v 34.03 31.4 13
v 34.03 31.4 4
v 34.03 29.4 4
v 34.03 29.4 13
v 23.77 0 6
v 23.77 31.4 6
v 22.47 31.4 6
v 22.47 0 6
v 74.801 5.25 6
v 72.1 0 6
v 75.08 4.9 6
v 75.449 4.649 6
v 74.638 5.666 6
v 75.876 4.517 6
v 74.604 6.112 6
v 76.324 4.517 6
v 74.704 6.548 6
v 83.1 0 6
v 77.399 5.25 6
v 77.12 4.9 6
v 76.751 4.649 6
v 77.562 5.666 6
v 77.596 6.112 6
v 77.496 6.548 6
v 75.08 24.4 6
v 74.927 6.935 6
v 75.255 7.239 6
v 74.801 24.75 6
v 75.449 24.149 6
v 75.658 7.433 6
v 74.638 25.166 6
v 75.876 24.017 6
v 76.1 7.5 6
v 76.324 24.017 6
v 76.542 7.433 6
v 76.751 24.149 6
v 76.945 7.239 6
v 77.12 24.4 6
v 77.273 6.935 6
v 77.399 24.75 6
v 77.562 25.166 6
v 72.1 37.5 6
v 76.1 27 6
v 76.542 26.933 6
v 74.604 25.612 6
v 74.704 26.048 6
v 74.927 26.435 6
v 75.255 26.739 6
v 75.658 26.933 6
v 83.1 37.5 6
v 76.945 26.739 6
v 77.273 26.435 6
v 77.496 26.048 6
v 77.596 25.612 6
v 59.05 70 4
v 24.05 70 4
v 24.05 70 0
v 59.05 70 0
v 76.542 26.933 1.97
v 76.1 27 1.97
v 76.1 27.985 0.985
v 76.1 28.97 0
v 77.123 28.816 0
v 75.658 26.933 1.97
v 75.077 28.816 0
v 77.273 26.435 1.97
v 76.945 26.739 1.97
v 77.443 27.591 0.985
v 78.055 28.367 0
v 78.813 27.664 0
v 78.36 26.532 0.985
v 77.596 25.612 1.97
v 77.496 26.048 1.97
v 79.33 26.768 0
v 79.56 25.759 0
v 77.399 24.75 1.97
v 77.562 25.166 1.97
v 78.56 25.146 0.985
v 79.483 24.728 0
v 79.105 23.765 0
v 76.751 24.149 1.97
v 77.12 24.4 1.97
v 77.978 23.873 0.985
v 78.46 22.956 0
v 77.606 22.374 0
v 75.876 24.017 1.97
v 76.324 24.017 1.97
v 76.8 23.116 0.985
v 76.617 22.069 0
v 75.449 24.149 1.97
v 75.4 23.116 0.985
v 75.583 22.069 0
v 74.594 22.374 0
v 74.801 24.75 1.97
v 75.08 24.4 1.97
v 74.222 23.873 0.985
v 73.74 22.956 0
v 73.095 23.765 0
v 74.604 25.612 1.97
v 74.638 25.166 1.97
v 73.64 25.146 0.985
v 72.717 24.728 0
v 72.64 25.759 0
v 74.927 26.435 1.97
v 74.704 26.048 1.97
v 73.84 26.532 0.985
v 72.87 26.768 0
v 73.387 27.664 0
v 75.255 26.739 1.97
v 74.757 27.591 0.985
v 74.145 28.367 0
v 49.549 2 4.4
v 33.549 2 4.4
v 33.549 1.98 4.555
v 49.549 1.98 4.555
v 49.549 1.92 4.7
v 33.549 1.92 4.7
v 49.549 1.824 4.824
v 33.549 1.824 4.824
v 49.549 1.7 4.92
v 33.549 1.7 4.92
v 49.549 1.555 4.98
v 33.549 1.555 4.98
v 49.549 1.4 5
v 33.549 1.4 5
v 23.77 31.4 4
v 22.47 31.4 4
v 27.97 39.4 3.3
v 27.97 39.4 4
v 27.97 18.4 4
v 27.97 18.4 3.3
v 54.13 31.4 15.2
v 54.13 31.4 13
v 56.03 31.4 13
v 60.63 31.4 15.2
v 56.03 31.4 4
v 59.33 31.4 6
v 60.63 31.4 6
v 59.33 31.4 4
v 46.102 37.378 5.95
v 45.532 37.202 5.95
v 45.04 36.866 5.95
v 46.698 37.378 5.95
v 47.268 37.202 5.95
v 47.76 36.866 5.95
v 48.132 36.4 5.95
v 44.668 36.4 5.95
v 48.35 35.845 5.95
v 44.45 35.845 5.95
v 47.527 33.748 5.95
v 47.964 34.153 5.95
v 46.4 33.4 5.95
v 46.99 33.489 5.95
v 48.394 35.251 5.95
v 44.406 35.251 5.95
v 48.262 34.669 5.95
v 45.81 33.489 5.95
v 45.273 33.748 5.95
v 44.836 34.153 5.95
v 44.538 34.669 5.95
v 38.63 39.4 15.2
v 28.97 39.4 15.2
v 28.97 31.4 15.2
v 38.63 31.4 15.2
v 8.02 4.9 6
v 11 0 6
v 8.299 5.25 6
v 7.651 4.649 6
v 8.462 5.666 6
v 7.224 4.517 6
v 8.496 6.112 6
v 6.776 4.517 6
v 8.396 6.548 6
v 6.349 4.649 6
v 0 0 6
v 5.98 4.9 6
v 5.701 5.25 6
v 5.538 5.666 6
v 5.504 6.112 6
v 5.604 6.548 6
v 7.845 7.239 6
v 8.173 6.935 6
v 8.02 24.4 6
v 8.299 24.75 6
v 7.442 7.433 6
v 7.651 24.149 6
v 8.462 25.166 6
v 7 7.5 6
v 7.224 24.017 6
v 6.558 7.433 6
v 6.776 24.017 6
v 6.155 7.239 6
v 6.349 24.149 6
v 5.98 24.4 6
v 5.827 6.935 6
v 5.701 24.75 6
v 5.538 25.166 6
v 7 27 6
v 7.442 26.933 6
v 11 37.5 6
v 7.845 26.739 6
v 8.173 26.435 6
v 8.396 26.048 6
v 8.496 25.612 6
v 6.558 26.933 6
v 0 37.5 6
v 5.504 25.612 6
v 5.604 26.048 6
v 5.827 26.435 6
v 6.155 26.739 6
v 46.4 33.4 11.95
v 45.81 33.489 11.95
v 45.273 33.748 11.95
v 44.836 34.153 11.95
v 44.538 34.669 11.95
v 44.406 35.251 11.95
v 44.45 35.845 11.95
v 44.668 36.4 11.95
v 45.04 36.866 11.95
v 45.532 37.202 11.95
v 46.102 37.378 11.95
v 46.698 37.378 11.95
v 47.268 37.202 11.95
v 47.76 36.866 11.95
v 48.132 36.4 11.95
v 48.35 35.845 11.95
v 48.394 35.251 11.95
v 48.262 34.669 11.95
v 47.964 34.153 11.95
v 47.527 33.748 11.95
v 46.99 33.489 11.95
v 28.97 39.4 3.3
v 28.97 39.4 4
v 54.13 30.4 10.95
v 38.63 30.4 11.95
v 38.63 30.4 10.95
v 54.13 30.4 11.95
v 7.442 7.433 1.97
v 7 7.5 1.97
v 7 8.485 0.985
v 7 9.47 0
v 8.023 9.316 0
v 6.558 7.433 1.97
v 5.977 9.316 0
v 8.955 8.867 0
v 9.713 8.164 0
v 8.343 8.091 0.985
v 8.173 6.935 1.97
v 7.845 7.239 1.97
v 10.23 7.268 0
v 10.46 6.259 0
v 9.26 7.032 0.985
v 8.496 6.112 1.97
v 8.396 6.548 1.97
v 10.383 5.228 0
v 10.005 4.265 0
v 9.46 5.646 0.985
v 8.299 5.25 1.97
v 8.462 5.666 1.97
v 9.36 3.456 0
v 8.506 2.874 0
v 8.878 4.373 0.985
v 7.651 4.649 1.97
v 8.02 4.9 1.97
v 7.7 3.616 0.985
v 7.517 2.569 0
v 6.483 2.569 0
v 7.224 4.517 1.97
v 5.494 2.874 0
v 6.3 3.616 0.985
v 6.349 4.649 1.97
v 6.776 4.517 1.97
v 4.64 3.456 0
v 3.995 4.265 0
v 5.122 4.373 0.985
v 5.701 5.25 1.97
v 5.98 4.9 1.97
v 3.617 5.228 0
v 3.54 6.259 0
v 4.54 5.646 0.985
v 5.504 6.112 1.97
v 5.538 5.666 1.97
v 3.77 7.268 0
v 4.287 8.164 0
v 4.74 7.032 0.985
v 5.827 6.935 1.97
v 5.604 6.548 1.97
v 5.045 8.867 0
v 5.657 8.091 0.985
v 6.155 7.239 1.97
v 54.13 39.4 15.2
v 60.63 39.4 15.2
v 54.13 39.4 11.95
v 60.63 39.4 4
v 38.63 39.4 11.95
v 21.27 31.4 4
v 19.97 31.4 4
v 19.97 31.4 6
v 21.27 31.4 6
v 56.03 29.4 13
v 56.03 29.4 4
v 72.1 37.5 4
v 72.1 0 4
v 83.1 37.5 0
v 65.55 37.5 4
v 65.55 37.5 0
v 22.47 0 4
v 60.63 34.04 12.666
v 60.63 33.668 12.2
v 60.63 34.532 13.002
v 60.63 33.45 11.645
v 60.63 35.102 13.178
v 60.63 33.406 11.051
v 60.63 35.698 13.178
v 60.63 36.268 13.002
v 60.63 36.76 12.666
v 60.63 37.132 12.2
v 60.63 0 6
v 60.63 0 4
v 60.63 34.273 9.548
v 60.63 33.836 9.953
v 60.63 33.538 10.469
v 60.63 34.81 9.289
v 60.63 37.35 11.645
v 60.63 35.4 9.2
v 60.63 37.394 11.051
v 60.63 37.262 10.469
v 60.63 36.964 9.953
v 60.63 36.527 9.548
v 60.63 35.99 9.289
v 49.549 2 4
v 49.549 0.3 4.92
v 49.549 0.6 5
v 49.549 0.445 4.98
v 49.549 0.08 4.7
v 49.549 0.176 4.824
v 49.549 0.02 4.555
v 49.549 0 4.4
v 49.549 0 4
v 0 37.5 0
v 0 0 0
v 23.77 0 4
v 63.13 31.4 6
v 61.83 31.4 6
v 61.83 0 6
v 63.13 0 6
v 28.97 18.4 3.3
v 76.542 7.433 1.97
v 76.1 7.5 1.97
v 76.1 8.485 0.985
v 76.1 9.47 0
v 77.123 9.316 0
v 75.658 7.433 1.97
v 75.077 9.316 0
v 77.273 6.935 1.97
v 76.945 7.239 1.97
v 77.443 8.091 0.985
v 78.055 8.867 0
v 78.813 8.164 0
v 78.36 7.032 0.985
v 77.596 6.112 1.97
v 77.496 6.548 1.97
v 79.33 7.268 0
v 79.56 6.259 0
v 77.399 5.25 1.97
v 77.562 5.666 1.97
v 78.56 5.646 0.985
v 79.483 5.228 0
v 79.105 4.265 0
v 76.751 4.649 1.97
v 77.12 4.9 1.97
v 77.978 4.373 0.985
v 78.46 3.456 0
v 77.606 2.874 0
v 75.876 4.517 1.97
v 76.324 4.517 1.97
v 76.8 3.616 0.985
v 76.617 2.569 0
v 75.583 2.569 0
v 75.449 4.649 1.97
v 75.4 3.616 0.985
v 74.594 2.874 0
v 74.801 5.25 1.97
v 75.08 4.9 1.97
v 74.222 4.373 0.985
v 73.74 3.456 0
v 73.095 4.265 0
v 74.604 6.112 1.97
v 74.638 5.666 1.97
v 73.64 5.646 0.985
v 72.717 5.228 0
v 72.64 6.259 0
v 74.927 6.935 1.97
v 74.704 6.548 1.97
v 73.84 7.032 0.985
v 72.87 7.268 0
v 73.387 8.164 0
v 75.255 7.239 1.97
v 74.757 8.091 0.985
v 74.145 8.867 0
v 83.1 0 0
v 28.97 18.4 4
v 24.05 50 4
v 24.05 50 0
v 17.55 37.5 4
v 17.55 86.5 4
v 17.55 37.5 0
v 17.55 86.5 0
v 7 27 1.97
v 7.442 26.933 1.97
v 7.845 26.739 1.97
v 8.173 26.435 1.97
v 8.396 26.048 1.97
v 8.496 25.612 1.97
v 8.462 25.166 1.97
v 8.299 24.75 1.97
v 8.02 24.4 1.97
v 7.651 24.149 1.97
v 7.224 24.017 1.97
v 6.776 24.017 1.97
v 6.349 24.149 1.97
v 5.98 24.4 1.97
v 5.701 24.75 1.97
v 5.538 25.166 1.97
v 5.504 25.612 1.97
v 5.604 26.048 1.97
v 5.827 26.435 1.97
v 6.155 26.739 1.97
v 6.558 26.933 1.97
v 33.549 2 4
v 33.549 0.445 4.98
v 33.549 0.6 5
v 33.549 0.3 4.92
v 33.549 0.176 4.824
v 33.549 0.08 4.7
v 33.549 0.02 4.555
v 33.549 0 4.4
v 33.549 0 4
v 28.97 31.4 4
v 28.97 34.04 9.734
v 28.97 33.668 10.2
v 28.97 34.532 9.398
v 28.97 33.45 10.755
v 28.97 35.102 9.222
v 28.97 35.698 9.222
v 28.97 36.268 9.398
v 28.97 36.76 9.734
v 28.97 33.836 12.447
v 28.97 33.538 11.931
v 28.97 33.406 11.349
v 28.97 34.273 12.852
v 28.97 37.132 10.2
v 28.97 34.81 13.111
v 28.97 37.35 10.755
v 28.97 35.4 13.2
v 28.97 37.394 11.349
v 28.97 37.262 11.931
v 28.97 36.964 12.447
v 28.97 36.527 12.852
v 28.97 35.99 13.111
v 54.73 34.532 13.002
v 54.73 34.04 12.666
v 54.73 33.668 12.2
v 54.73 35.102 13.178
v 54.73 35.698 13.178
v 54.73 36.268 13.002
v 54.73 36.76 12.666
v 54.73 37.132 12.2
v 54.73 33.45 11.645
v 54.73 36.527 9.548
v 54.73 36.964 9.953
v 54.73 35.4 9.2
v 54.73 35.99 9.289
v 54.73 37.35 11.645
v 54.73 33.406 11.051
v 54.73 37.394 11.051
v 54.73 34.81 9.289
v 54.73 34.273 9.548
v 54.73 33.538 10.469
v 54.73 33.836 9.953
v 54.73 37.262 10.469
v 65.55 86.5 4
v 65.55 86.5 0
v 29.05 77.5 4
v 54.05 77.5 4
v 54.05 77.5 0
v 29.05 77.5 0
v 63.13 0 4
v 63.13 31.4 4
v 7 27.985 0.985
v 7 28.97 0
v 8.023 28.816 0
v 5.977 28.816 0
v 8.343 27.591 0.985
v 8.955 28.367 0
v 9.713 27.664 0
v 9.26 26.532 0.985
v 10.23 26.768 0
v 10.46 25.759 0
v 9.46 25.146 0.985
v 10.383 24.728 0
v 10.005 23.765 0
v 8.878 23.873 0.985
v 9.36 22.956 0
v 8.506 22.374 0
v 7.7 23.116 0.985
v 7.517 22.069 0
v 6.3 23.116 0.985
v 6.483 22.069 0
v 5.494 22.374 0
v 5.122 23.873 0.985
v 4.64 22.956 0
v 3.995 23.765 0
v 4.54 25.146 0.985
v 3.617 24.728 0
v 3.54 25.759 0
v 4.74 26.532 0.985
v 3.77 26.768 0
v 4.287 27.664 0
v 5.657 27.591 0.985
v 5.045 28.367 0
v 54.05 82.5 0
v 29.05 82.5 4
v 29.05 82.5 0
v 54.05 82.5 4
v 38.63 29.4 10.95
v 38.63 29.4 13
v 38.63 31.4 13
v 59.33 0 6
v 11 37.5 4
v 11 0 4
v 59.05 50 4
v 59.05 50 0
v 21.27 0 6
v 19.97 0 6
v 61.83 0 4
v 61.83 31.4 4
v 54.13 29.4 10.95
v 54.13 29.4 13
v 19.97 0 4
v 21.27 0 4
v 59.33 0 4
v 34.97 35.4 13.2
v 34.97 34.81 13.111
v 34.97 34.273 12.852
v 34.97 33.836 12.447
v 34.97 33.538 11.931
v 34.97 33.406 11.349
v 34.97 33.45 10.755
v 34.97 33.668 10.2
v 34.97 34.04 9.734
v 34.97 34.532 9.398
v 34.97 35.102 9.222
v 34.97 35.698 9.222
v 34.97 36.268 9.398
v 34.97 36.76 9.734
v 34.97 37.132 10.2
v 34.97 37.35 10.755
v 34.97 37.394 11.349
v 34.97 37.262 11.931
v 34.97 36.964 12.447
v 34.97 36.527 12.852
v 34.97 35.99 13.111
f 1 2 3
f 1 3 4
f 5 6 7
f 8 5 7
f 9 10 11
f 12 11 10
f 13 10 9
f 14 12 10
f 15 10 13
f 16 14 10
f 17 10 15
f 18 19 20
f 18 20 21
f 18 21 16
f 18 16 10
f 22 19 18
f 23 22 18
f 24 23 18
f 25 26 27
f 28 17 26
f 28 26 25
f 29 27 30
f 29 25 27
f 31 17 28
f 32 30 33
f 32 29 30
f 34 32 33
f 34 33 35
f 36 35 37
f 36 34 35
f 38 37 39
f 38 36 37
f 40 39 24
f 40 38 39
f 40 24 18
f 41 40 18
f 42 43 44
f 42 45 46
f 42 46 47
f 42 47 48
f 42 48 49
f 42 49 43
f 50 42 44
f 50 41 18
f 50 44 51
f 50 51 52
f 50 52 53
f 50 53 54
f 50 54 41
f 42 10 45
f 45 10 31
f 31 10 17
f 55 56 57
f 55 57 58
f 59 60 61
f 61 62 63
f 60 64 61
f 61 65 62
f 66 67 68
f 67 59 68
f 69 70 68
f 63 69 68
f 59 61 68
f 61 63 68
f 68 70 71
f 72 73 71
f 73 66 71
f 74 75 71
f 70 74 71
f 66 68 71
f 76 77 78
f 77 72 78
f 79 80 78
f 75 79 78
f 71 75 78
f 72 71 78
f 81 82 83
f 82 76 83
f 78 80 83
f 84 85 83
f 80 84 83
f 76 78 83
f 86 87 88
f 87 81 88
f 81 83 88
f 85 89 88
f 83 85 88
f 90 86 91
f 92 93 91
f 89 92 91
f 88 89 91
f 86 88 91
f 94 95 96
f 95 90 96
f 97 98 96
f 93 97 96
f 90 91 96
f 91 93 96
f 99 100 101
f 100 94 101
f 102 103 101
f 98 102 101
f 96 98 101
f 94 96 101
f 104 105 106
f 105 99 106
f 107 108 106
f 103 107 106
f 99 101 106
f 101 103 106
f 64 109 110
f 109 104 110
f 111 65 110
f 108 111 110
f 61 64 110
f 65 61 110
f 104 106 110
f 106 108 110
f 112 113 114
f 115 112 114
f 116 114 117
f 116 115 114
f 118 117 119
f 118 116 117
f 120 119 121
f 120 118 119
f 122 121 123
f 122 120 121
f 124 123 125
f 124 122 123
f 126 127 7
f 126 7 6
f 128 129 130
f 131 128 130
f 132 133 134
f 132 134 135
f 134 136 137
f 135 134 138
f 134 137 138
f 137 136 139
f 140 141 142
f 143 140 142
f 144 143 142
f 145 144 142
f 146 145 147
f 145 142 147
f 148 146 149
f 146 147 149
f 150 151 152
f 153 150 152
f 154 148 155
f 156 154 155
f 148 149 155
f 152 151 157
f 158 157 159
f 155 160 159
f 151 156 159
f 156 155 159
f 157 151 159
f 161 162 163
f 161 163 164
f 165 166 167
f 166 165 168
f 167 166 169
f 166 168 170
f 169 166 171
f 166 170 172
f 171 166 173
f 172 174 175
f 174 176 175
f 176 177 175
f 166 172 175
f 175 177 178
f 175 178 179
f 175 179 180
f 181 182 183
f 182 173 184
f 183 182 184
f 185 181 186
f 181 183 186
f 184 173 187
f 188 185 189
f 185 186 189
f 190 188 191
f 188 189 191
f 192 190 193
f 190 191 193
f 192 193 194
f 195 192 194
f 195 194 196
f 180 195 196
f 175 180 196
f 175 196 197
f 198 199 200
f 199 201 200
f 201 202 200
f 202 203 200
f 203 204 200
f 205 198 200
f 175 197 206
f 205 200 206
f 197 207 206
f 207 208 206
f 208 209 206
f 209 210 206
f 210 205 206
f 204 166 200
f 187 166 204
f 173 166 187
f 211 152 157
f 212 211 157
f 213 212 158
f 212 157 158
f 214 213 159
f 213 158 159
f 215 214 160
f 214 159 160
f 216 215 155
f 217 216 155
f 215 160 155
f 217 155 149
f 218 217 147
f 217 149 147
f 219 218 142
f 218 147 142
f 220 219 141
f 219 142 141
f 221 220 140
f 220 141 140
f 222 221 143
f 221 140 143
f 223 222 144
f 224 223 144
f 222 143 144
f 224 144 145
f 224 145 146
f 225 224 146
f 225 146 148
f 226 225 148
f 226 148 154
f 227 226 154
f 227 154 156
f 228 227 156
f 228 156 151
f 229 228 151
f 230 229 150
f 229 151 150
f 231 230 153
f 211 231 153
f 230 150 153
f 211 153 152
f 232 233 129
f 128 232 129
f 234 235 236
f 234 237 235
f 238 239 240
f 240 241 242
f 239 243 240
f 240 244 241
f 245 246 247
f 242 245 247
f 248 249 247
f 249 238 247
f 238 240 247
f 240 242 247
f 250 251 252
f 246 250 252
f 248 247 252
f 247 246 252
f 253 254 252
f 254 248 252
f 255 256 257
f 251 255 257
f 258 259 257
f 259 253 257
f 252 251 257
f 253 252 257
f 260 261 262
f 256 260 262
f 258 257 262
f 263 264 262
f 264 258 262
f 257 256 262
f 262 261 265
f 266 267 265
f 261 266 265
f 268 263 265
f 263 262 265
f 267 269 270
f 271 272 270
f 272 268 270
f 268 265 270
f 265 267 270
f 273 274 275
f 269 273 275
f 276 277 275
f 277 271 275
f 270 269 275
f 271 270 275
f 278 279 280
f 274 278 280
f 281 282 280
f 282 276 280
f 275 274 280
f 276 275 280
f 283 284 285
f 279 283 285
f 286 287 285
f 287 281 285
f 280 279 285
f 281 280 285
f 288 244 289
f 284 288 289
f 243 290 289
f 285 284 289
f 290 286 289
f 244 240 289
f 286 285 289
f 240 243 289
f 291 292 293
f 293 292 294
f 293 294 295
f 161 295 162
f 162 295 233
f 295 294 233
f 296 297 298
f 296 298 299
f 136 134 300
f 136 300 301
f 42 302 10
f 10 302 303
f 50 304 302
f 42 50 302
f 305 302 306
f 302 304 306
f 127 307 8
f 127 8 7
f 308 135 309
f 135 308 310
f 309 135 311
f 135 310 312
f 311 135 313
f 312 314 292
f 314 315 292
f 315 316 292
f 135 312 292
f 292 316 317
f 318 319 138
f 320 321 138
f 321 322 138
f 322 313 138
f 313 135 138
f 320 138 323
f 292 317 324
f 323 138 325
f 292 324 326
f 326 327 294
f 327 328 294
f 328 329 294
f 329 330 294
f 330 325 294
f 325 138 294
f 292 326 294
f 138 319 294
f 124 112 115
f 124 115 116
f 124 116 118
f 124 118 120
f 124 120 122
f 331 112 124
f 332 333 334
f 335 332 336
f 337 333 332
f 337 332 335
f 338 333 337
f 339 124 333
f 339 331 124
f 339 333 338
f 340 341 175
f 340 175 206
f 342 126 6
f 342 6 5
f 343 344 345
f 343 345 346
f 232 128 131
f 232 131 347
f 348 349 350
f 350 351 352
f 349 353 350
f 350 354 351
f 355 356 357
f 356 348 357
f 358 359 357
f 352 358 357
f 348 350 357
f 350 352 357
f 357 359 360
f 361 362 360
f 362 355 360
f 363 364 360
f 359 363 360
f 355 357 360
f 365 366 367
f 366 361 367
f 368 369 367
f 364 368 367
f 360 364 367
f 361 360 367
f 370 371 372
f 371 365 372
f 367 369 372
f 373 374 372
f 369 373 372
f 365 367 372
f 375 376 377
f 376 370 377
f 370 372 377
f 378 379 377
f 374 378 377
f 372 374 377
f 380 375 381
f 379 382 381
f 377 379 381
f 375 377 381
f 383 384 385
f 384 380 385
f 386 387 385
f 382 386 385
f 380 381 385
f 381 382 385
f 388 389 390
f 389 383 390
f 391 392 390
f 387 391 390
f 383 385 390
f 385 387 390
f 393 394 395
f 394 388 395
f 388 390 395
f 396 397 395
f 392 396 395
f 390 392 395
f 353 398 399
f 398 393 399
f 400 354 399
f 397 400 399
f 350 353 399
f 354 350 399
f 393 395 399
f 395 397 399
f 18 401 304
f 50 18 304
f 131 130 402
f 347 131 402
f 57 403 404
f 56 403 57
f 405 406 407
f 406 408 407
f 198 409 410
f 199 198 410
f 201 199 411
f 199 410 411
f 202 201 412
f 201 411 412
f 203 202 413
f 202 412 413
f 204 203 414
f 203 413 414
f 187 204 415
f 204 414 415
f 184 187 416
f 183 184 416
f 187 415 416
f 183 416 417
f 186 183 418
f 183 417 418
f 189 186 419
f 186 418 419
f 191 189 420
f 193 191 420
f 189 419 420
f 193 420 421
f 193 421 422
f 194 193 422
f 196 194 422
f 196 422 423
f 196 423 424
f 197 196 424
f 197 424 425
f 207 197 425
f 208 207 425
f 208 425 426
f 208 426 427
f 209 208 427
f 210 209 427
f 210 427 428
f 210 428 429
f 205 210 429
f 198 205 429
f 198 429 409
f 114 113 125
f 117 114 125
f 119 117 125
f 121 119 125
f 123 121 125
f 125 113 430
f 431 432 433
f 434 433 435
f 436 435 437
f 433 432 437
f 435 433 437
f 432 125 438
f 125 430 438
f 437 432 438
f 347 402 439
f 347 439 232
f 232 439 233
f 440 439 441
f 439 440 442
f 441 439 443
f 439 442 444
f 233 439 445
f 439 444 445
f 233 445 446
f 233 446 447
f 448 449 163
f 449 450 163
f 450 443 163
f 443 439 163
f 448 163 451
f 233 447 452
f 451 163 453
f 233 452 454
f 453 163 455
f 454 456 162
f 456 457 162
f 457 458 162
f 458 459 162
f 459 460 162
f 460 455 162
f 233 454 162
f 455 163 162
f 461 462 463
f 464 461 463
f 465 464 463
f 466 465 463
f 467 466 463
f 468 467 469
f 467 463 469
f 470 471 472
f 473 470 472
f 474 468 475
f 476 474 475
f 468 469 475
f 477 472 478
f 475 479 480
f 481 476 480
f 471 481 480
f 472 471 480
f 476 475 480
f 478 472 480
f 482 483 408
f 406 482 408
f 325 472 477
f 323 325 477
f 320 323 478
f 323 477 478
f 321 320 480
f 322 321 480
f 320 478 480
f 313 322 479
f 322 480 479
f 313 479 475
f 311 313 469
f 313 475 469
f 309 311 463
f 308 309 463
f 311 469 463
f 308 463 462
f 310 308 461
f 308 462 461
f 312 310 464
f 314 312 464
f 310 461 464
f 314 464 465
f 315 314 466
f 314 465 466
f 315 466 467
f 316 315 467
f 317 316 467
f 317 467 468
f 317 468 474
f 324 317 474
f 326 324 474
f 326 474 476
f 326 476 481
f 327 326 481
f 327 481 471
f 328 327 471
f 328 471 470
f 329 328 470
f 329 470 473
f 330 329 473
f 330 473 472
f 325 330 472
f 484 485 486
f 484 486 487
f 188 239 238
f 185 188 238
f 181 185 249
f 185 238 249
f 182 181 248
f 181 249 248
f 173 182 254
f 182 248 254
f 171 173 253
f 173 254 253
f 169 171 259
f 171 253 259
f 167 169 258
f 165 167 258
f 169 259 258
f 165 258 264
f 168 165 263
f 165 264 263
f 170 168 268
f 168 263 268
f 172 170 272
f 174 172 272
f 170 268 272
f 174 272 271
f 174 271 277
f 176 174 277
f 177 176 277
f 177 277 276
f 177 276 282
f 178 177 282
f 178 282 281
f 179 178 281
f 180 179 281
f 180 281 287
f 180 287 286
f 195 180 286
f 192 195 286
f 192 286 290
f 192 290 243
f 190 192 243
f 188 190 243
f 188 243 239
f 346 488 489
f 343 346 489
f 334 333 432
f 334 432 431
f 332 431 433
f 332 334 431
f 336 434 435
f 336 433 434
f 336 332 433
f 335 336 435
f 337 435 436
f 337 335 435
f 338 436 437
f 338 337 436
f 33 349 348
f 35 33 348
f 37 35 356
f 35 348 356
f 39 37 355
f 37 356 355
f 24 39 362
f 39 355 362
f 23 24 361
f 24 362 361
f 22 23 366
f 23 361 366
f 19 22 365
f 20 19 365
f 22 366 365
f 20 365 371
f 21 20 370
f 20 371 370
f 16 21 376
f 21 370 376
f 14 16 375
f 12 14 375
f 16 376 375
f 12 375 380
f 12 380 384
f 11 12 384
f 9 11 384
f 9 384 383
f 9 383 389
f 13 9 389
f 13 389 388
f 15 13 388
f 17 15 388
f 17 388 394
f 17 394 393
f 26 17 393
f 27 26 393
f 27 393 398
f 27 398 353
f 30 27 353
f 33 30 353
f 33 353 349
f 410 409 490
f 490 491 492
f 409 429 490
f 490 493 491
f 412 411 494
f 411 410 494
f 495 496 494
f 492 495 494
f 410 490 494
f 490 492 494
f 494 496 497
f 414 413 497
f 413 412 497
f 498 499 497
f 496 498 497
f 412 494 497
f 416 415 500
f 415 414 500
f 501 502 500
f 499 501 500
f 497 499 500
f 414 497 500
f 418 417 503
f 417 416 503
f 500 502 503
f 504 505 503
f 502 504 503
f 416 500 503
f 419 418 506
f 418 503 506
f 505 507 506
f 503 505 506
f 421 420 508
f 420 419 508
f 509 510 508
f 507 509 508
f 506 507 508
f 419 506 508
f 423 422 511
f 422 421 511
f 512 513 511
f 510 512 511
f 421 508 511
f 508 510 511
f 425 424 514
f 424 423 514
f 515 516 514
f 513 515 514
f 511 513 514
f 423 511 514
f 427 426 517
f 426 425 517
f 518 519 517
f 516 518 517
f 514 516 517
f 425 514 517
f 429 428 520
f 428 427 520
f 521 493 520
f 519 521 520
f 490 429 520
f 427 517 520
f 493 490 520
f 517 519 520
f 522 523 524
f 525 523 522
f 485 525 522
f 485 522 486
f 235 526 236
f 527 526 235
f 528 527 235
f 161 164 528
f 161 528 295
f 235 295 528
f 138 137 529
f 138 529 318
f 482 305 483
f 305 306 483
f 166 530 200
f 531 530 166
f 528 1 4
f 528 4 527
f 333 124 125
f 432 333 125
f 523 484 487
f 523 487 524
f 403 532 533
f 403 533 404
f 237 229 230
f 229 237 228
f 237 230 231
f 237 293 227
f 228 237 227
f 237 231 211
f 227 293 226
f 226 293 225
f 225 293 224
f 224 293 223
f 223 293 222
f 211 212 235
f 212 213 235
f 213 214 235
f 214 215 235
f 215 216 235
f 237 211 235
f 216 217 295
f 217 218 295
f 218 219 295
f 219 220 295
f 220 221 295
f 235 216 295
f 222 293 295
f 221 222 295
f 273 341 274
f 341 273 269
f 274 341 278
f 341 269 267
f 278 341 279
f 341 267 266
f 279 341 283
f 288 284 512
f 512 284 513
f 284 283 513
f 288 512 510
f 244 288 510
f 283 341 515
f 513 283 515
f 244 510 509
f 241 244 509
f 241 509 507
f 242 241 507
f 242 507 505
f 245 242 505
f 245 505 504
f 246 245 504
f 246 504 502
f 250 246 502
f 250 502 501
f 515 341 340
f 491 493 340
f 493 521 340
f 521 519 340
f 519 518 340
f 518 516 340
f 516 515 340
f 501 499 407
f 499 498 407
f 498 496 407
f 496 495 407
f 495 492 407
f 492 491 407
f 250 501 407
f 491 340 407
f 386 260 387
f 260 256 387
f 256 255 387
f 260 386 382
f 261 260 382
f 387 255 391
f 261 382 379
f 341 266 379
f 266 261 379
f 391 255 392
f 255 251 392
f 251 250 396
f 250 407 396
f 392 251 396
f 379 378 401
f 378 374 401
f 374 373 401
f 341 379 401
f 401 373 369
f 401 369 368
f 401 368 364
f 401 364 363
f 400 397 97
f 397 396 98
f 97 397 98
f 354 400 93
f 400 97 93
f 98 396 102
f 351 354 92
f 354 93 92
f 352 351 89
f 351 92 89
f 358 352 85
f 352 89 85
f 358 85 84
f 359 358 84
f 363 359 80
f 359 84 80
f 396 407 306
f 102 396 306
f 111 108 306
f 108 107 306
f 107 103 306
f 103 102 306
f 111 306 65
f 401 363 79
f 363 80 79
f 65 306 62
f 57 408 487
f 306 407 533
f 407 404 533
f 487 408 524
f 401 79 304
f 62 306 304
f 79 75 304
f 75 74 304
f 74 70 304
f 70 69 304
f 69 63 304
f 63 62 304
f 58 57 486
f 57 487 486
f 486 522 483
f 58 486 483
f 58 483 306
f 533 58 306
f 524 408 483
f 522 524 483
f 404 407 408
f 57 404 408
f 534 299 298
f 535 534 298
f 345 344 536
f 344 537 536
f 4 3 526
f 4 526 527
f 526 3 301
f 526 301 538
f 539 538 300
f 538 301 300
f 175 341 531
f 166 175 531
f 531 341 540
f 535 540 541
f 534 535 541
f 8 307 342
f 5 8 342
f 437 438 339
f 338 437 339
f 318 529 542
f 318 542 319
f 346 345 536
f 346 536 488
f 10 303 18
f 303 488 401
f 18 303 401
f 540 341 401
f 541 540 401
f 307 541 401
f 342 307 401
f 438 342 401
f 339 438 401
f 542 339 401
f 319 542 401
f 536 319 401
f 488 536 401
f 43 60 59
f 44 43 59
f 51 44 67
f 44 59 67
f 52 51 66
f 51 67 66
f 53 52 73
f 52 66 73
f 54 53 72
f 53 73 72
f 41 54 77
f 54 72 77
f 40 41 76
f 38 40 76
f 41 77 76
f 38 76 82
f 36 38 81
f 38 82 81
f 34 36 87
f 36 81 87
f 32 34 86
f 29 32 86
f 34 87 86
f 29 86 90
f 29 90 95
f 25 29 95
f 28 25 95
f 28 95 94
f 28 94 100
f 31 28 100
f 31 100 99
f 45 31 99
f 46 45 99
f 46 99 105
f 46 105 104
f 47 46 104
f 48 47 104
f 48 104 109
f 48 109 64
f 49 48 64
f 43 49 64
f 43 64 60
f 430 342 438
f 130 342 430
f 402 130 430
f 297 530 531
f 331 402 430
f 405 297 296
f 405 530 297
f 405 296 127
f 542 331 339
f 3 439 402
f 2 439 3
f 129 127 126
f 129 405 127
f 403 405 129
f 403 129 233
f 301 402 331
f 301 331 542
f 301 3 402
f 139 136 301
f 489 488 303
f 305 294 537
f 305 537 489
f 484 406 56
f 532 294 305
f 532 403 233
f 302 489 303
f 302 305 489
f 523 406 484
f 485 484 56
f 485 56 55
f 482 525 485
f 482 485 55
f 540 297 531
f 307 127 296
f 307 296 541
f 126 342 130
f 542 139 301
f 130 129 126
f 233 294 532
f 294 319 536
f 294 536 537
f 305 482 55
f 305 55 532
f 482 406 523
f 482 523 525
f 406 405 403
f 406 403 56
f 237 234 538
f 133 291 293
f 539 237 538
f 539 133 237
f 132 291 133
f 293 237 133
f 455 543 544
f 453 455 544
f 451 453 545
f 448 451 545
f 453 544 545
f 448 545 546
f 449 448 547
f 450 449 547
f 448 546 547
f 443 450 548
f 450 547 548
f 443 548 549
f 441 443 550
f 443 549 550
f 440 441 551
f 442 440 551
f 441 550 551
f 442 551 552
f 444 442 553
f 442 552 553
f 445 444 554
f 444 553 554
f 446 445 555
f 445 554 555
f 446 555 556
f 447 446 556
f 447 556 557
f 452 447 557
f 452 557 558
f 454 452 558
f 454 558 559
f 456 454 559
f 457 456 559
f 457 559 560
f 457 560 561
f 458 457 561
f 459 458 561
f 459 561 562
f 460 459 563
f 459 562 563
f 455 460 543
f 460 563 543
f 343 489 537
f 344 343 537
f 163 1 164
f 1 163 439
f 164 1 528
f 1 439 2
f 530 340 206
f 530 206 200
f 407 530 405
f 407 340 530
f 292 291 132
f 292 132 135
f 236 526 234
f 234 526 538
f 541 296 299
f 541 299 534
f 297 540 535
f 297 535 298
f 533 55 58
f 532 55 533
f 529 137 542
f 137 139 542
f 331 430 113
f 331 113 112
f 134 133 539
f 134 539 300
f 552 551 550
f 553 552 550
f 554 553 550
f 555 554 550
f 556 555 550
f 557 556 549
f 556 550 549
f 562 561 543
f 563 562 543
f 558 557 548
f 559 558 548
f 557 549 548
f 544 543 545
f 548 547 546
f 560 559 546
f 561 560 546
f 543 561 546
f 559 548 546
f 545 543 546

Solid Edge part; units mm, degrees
sketch "Sketch1" plane through (0, 0, 0) normal (0, 0, 1) x (1, 0, 0)
  line L0 (83.1, 37.5) -> (65.55, 37.5)
  line L1 (65.55, 37.5) -> (65.55, 86.5)
  line L2 (65.55, 86.5) -> (17.55, 86.5)
  line L3 (17.55, 86.5) -> (17.55, 37.5)
  line L4 (0, 37.5) -> (17.55, 37.5)
  line L5 (0, 0) -> (0, 37.5)
  line L6 (0, 0) -> (83.1, 0)
  line L7 (83.1, 0) -> (83.1, 37.5)
extrude "Protrusion1" add sketch "Sketch1" along normal blind 4
sketch "Sketch2" plane through (40.5, 43.25, 4) normal (0, 0, 1) x (1, 0, 0)
  line L0 (-29.5, -5.75) -> (-29.5, -43.25)
  line L1 (-29.5, -43.25) -> (-40.5, -43.25)
  line L2 (-40.5, -43.25) -> (-40.5, -5.75)
  line L3 (-40.5, -5.75) -> (-29.5, -5.75)
  line L4 (-20.53, -43.25) -> (-20.53, -11.85)
  line L5 (-20.53, -11.85) -> (-19.23, -11.85)
  line L6 (-19.23, -11.85) -> (-19.23, -43.25)
  line L7 (-19.23, -43.25) -> (-20.53, -43.25)
  line L8 (-16.73, -11.85) -> (-16.73, -43.25)
  line L9 (-16.73, -43.25) -> (-18.03, -43.25)
  line L10 (-18.03, -43.25) -> (-18.03, -11.85)
  line L11 (-18.03, -11.85) -> (-16.73, -11.85)
  line L12 (18.83, -11.85) -> (18.83, -43.25)
  line L13 (18.83, -43.25) -> (20.13, -43.25)
  line L14 (20.13, -43.25) -> (20.13, -11.85)
  line L15 (20.13, -11.85) -> (18.83, -11.85)
  line L16 (22.63, -43.25) -> (22.63, -11.85)
  line L17 (22.63, -11.85) -> (21.33, -11.85)
  line L18 (21.33, -11.85) -> (21.33, -43.25)
  line L19 (21.33, -43.25) -> (22.63, -43.25)
  line L20 (31.6, -5.75) -> (31.6, -43.25)
  line L21 (31.6, -43.25) -> (42.6, -43.25)
  line L22 (42.6, -43.25) -> (42.6, -5.75)
  line L23 (42.6, -5.75) -> (31.6, -5.75)
  dimension "D1" = 37.5
  dimension "D2" = 6.55
  dimension "D3" = 6.55
  dimension "D4" = 37.5
  dimension "D5" = 11
  dimension "D6" = 11
  dimension "D7" = 2.42
  dimension "D8" = 31.4
  dimension "D9" = 1.3
  dimension "D10" = 31.4
  dimension "D11" = 1.3
  dimension "D12" = 4.92
  dimension "D13" = 31.4
  dimension "D14" = 1.3
  dimension "D15" = 2.42
  dimension "D16" = 31.4
  dimension "D17" = 1.3
  dimension "D18" = 4.92
  dimension "D19" = 6
  dimension "D20" = 13
  dimension "D21" = 1
extrude "ExtrudedProtrusion_2" add sketch "Sketch2" along normal blind 2
sketch "Sketch3" plane through (41.55, 43.25, 4) normal (0, 0, 1) x (1, 0, 0)
  line L0 (-12.58, -11.85) -> (19.08, -11.85)
  line L1 (19.08, -11.85) -> (19.08, -3.85)
  line L2 (19.08, -3.85) -> (-12.58, -3.85)
  line L3 (-12.58, -11.85) -> (-12.58, -3.85)
extrude "ExtrudedProtrusion_3" add sketch "Sketch3" along normal blind 11.2
hole "Hole_1" at (60.63, 35.4, 11.2) direction (-1, 0, 0) diameter 4 depth 5.9
sketch "Sketch4" plane through (41.55, 43.25, 4) normal (0, 0, 1) x (1, 0, 0)
  line L0 (12.5, 34.25) -> (-12.5, 34.25)
  line L1 (-12.5, 34.25) -> (-12.5, 39.25)
  line L2 (-12.5, 39.25) -> (12.5, 39.25)
  line L3 (12.5, 39.25) -> (12.5, 34.25)
  line L4 (-17.5, 26.75) -> (17.5, 26.75)
  line L5 (17.5, 26.75) -> (17.5, 6.75)
  line L6 (17.5, 6.75) -> (-17.5, 6.75)
  line L7 (-17.5, 6.75) -> (-17.5, 26.75)
  dimension "D1" = 35
  dimension "D2" = 20
  dimension "D3" = 12.5
  dimension "D4" = 6.5
  dimension "D5" = 25
  dimension "D6" = 5
  dimension "D7" = 4
  dimension "D8" = 11.5
extrude "Cutout1" cut sketch "Sketch4" against normal through all
hole "Hole_3" at (7, 6, 0) direction (0, 0, 1) diameter 3 end through all countersink diameter 6.94 countersink angle 90
hole "Hole1" at (7, 25.5, 0) direction (0, 0, 1) diameter 3 end through all countersink diameter 6.94 countersink angle 90
hole "Hole2" at (76.1, 6, 0) direction (0, 0, 1) diameter 3 end through all countersink diameter 6.94 countersink angle 90
hole "Hole3" at (76.1, 25.5, 0) direction (0, 0, 1) diameter 3 end through all countersink diameter 6.94 countersink angle 90
sketch "Sketch5" plane through (41.55, 15.7, 4) normal (0, 0, 1) x (1, 0, 0)
  line L0 (-8.0007, -13.7) -> (7.9993, -13.7)
  line L1 (7.9993, -13.7) -> (7.9993, -15.7)
  line L2 (-8.0007, -15.7) -> (7.9993, -15.7)
  line L3 (-8.0007, -13.7) -> (-8.0007, -15.7)
extrude "ExtrudedProtrusion_4" add sketch "Sketch5" along normal blind 1
fillet "Round_1" radius 0.6 2 edges at (41.5493, 2, 5) (41.5493, 0, 5)
sketch "Sketch6" plane through (40.5, 43.25, 4) normal (0, 0, 1) x (1, 0, 0)
  line L0 (-11.53, -24.85) -> (-11.53, -11.85)
  line L1 (-11.53, -11.85) -> (-12.53, -11.85)
  line L2 (-12.53, -11.85) -> (-12.53, -24.85)
  line L3 (-12.53, -24.85) -> (-11.53, -24.85)
extrude "ExtrudedCutout_7" cut sketch "Sketch6" against normal blind 0.7
sketch "Sketch7" plane through (41.55, 35.4, 15.2) normal (0, 0, 1) x (1, 0, 0)
  line L0 (-13.58, 4) -> (-13.58, -4)
  line L1 (-13.58, -4) -> (-12.58, -4)
  line L2 (-12.58, -4) -> (-12.58, 4)
  line L3 (-12.58, 4) -> (-13.58, 4)
extrude "ExtrudedCutout_8" cut sketch "Sketch7" against normal blind 11.9
hole "Hole_7" at (28.97, 35.4, 11.2) direction (1, 0, 0) diameter 4 depth 6
sketch "Sketch8" plane through (44.8, 31.4, 9.6) normal (0, -1, 0) x (-1, 0, 0)
  line L0 (-11.23, -3.4) -> (-11.23, 5.6)
  line L1 (-11.23, 5.6) -> (10.77, 5.6)
  line L2 (10.77, 5.6) -> (10.77, -3.4)
  line L3 (10.77, -3.4) -> (-11.23, -3.4)
extrude "ExtrudedProtrusion_5" add sketch "Sketch8" along normal blind 2
sketch "Sketch9" plane through (44.8, 35.4, 15.2) normal (0, 0, 1) x (-1, 0, 0)
  line L0 (-9.33, -4.6) -> (-9.33, 7.4)
  line L1 (-9.33, 7.4) -> (6.17, 7.4)
  line L2 (6.17, 7.4) -> (6.17, -4.6)
  line L3 (6.17, -4.6) -> (-9.33, -4.6)
extrude "ExtrudedCutout_10" cut sketch "Sketch9" against normal blind 3.25
sketch "Sketch10" plane through (45.03, 29.4, 8.5) normal (0, -1, 0) x (-1, 0, 0)
  line L0 (6.4, -2.45) -> (-9.1, -2.45)
  line L1 (-9.1, -2.45) -> (-9.1, -3.45)
  line L2 (-9.1, -3.45) -> (6.4, -3.45)
  line L3 (6.4, -3.45) -> (6.4, -2.45)
extrude "ExtrudedCutout_11" cut sketch "Sketch10" against normal blind 1
hole "Hole_8" at (46.4, 35.4, 11.95) direction (0, 0, -1) diameter 4 depth 6
